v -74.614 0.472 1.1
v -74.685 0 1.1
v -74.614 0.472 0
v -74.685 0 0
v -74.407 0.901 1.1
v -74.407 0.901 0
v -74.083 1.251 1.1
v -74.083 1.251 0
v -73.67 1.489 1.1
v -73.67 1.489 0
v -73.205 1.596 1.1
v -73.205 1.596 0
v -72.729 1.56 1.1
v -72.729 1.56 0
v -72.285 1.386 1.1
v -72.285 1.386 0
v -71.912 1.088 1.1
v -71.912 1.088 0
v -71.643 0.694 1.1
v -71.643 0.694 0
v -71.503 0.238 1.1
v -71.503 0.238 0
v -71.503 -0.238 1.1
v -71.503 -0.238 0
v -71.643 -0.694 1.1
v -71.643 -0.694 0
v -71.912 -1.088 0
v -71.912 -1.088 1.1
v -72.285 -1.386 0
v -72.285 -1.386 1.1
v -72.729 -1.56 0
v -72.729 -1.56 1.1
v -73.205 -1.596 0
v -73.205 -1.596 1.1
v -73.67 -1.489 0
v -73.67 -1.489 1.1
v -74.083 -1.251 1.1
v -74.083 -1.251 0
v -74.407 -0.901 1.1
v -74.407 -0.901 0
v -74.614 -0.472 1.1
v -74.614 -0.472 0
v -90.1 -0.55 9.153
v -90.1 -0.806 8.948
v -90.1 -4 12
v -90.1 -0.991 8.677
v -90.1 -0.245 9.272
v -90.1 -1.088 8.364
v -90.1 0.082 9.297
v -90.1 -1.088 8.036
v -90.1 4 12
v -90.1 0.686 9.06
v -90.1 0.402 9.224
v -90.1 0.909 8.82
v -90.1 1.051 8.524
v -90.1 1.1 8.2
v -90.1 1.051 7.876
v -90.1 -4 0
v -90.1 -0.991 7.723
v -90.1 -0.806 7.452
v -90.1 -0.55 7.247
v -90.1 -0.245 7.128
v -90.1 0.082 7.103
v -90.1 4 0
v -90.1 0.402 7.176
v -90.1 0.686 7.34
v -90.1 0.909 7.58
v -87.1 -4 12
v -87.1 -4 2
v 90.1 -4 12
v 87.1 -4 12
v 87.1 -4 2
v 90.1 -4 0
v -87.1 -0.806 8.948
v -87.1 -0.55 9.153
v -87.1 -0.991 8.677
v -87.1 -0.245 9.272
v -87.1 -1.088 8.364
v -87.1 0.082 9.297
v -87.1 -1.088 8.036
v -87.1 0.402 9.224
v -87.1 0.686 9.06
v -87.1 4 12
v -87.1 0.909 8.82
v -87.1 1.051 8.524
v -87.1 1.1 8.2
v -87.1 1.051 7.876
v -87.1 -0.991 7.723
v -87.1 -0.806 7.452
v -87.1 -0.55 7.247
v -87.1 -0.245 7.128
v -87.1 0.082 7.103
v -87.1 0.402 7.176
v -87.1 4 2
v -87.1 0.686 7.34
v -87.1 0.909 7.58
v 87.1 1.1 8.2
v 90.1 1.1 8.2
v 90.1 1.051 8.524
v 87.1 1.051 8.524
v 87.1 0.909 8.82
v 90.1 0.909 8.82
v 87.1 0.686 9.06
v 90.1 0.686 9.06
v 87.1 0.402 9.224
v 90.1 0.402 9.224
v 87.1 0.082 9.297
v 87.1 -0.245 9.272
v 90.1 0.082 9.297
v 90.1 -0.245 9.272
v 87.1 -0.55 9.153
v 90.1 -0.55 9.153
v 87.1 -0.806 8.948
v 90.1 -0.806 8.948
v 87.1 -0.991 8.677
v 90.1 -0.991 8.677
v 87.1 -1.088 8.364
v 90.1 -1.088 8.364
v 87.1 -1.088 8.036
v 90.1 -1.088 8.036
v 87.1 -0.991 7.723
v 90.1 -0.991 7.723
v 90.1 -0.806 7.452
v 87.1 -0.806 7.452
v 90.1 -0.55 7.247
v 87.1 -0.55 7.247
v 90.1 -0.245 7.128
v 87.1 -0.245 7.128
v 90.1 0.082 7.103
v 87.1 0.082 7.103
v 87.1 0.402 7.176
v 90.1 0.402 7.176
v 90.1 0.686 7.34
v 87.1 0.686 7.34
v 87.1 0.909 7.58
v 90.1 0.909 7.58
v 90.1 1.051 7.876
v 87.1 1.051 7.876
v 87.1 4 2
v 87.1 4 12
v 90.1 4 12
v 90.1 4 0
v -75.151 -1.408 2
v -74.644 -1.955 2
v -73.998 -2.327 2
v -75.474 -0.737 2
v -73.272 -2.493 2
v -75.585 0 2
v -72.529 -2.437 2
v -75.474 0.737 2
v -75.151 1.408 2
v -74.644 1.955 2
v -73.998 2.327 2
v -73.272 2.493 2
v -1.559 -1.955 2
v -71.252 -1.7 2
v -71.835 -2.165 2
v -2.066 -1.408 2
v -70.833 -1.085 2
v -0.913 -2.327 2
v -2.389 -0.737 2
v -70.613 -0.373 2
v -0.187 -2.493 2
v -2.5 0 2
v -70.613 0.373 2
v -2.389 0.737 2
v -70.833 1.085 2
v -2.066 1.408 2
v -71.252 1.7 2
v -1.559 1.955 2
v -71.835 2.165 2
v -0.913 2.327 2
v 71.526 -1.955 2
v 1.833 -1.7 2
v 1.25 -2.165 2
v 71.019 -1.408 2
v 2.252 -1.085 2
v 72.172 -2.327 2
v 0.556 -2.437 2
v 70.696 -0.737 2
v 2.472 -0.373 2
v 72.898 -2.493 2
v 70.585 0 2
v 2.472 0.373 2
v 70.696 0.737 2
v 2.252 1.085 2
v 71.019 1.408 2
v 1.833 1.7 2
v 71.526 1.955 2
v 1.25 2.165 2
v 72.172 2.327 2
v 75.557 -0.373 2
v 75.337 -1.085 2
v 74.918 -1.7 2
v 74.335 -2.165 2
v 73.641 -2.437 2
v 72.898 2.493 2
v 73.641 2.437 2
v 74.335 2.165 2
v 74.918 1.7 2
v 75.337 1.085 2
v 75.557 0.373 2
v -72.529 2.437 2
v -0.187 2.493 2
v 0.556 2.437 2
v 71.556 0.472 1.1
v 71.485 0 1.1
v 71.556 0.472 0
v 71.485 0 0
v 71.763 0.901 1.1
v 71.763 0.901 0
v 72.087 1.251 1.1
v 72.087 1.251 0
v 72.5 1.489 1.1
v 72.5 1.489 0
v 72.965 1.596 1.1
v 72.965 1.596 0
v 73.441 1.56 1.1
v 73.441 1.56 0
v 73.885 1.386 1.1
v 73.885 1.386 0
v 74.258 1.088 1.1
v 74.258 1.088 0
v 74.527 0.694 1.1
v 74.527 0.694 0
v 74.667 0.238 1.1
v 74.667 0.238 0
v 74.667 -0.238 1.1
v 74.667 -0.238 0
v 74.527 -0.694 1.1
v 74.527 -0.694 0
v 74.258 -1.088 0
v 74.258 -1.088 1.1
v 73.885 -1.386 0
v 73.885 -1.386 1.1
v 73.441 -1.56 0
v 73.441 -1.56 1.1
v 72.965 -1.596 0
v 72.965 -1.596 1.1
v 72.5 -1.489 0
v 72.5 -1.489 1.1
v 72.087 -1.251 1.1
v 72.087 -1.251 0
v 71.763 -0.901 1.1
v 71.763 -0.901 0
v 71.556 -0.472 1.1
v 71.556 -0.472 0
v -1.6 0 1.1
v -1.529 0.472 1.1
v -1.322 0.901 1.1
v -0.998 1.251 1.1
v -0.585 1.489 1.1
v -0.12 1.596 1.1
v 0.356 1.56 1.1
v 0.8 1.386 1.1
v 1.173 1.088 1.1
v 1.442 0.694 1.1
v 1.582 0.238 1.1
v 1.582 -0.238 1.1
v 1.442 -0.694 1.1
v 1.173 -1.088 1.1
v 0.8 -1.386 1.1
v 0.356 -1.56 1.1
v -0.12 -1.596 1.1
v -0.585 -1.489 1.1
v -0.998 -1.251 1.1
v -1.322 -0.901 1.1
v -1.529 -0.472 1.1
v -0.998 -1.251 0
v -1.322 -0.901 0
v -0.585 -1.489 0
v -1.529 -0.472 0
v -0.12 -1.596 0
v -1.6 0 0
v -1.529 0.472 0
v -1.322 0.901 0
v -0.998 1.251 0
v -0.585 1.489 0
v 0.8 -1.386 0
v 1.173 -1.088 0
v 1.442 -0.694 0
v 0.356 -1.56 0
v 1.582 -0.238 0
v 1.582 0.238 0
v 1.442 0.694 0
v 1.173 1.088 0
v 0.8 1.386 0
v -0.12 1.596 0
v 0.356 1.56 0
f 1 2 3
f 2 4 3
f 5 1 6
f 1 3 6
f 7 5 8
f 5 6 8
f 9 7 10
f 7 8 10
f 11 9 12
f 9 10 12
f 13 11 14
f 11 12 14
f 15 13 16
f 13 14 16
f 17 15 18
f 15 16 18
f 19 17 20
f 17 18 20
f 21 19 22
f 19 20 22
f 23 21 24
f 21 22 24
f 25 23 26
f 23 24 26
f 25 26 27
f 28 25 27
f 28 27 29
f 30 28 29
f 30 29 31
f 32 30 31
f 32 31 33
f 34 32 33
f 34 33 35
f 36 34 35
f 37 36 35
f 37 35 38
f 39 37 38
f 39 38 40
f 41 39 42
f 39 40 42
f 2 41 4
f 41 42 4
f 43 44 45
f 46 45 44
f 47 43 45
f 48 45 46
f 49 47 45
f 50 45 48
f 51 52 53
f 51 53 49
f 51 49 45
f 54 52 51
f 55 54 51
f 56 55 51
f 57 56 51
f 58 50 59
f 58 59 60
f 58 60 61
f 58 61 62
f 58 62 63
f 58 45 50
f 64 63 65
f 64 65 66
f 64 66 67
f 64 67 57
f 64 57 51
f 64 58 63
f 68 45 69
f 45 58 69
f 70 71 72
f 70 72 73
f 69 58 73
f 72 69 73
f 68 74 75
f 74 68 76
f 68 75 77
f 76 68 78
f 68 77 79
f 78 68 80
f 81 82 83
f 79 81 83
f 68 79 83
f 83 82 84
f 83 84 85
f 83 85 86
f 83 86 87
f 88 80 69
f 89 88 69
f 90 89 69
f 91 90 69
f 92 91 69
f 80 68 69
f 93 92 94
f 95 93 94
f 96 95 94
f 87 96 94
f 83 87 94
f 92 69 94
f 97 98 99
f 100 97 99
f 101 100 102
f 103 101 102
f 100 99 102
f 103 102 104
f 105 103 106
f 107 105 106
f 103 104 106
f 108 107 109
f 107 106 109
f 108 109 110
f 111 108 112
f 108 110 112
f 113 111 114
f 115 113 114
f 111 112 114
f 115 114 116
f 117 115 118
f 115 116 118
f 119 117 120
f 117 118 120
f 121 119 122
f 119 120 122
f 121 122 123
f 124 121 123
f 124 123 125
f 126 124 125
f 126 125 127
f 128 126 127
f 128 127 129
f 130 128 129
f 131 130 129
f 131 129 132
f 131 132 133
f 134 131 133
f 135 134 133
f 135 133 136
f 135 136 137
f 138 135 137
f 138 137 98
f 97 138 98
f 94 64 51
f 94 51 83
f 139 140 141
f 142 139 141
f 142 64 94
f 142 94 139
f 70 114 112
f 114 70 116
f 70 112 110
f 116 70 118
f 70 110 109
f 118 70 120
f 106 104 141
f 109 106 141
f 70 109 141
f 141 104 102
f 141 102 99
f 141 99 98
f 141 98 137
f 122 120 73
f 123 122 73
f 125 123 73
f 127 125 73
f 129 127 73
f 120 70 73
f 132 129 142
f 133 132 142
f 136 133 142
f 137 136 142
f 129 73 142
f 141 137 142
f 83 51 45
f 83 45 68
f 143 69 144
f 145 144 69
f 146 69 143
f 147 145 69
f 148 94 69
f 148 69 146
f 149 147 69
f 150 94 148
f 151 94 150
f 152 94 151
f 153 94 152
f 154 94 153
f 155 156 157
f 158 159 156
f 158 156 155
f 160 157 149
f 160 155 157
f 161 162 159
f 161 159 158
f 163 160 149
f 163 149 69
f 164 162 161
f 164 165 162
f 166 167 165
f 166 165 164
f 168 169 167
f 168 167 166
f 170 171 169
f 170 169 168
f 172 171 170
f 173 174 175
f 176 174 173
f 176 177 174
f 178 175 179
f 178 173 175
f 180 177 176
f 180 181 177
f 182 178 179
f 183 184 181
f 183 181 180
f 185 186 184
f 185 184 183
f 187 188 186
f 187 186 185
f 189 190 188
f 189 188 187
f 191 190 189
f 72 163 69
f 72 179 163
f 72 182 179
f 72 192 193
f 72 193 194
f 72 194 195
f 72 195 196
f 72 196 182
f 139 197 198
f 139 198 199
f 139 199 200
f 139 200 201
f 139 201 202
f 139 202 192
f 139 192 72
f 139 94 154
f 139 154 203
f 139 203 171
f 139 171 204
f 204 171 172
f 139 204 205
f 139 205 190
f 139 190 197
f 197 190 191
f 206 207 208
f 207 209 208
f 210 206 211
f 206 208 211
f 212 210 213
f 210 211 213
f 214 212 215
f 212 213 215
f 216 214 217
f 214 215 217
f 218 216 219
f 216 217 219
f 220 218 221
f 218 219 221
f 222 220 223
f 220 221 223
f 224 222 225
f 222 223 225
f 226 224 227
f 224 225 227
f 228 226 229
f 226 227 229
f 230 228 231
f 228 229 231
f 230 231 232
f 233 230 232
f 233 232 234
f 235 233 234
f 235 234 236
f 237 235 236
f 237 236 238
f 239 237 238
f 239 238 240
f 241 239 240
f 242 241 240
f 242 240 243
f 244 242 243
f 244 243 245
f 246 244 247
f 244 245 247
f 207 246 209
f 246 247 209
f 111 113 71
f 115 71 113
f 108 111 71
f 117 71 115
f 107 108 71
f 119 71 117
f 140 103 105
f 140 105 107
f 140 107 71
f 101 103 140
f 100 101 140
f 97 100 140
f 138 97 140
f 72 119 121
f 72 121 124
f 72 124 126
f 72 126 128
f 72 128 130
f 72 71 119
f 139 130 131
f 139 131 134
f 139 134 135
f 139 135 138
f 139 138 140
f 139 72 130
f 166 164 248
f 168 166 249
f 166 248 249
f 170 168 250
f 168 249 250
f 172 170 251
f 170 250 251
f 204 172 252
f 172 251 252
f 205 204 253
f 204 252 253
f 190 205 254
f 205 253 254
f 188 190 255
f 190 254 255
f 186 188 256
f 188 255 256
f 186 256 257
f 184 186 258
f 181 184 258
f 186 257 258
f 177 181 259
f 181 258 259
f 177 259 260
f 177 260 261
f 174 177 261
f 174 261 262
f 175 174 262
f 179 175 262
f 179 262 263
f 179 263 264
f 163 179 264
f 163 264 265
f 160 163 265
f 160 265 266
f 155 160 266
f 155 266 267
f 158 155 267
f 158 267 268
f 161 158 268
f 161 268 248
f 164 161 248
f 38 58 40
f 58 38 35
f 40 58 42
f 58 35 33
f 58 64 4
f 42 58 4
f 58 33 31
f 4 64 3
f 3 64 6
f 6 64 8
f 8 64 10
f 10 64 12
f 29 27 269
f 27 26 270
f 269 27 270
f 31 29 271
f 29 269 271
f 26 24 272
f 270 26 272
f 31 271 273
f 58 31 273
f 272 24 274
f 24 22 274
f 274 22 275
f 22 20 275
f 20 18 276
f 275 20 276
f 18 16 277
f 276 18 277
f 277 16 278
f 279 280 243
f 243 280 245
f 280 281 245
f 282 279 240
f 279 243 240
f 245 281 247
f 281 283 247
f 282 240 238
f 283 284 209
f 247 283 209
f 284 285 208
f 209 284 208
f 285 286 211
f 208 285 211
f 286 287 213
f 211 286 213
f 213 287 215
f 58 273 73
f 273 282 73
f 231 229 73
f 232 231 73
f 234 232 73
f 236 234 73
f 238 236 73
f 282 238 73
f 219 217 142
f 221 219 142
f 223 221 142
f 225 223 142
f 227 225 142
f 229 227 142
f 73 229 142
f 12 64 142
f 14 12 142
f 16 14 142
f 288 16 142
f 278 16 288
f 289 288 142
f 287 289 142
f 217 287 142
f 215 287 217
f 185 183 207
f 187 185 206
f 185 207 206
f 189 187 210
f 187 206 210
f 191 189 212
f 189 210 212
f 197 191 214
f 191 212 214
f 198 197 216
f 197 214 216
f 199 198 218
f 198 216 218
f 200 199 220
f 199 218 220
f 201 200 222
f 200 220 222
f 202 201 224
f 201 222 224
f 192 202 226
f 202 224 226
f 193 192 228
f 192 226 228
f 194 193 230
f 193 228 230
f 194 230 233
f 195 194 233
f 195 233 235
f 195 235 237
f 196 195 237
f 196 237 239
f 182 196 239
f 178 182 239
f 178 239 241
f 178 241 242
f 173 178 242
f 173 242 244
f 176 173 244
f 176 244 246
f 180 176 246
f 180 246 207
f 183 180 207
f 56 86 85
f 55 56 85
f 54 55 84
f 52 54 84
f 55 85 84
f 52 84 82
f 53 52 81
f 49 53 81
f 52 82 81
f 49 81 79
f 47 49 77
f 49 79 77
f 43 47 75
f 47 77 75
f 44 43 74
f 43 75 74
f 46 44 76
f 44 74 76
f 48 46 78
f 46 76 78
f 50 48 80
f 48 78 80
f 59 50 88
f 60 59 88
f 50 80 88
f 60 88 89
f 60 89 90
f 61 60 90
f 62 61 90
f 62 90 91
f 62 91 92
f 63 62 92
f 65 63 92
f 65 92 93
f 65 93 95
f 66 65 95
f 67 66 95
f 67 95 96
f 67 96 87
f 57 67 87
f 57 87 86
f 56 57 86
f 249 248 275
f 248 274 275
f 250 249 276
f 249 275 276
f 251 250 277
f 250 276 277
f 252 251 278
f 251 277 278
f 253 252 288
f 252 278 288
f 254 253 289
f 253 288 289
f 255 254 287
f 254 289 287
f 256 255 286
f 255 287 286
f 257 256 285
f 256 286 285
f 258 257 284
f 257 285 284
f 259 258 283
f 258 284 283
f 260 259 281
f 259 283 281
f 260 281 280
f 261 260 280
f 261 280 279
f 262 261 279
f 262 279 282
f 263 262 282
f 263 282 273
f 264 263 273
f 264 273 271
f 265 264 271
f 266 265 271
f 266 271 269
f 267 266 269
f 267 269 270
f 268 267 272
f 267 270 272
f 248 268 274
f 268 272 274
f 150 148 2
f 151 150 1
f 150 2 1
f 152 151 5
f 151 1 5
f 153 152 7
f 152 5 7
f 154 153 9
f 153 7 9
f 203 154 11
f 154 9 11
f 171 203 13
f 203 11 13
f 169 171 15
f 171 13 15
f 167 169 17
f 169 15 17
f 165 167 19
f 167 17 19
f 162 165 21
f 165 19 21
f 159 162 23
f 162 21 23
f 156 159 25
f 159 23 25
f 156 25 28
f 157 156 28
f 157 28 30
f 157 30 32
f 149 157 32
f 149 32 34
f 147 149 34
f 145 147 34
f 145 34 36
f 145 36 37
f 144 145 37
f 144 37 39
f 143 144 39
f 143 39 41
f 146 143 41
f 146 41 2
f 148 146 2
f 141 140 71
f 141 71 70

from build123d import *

# Parameters (mm, degrees)
SKETCH_W            = 180.2
SKETCH_H            = 8
PAD_DEPTH           = 2
SKETCH001_W         = 3
SKETCH001_H         = 8
PAD001_DEPTH        = 10
SKETCH002_R         = 1.1
HOLE_DEPTH          = 180.201
HOLE001_D           = 3.2
HOLE001_CSINK_D     = 5
HOLE001_CSINK_ANGLE = 90


with BuildPart() as part:
    # Sketch → Pad (new body)
    with BuildSketch(Plane.XY):
        Rectangle(SKETCH_W, SKETCH_H)
    extrude(amount=PAD_DEPTH)

    # Sketch001 (on Face6 of Pad) → Pad001 (join)
    with BuildSketch(Plane.XY.offset(2)):
        with Locations((-88.6, 0)):
            Rectangle(SKETCH001_W, SKETCH001_H)
        with Locations((88.6, 0)):
            Rectangle(SKETCH001_W, SKETCH001_H)
    extrude(amount=PAD001_DEPTH)

    # Sketch002 → Hole (cut, through all)
    with BuildSketch(Plane.YZ.offset(90.1)):
        with Locations((0, 8.2)):
            Circle(SKETCH002_R)
    extrude(amount=-HOLE_DEPTH, mode=Mode.SUBTRACT)

    # Hole001 (through all)
    with Locations(Plane.XY.offset(2)):
        with Locations((-73.085, 0), (0, 0), (73.085, 0)):
            CounterSinkHole(HOLE001_D / 2, HOLE001_CSINK_D / 2, counter_sink_angle=HOLE001_CSINK_ANGLE)


solid = part.part
